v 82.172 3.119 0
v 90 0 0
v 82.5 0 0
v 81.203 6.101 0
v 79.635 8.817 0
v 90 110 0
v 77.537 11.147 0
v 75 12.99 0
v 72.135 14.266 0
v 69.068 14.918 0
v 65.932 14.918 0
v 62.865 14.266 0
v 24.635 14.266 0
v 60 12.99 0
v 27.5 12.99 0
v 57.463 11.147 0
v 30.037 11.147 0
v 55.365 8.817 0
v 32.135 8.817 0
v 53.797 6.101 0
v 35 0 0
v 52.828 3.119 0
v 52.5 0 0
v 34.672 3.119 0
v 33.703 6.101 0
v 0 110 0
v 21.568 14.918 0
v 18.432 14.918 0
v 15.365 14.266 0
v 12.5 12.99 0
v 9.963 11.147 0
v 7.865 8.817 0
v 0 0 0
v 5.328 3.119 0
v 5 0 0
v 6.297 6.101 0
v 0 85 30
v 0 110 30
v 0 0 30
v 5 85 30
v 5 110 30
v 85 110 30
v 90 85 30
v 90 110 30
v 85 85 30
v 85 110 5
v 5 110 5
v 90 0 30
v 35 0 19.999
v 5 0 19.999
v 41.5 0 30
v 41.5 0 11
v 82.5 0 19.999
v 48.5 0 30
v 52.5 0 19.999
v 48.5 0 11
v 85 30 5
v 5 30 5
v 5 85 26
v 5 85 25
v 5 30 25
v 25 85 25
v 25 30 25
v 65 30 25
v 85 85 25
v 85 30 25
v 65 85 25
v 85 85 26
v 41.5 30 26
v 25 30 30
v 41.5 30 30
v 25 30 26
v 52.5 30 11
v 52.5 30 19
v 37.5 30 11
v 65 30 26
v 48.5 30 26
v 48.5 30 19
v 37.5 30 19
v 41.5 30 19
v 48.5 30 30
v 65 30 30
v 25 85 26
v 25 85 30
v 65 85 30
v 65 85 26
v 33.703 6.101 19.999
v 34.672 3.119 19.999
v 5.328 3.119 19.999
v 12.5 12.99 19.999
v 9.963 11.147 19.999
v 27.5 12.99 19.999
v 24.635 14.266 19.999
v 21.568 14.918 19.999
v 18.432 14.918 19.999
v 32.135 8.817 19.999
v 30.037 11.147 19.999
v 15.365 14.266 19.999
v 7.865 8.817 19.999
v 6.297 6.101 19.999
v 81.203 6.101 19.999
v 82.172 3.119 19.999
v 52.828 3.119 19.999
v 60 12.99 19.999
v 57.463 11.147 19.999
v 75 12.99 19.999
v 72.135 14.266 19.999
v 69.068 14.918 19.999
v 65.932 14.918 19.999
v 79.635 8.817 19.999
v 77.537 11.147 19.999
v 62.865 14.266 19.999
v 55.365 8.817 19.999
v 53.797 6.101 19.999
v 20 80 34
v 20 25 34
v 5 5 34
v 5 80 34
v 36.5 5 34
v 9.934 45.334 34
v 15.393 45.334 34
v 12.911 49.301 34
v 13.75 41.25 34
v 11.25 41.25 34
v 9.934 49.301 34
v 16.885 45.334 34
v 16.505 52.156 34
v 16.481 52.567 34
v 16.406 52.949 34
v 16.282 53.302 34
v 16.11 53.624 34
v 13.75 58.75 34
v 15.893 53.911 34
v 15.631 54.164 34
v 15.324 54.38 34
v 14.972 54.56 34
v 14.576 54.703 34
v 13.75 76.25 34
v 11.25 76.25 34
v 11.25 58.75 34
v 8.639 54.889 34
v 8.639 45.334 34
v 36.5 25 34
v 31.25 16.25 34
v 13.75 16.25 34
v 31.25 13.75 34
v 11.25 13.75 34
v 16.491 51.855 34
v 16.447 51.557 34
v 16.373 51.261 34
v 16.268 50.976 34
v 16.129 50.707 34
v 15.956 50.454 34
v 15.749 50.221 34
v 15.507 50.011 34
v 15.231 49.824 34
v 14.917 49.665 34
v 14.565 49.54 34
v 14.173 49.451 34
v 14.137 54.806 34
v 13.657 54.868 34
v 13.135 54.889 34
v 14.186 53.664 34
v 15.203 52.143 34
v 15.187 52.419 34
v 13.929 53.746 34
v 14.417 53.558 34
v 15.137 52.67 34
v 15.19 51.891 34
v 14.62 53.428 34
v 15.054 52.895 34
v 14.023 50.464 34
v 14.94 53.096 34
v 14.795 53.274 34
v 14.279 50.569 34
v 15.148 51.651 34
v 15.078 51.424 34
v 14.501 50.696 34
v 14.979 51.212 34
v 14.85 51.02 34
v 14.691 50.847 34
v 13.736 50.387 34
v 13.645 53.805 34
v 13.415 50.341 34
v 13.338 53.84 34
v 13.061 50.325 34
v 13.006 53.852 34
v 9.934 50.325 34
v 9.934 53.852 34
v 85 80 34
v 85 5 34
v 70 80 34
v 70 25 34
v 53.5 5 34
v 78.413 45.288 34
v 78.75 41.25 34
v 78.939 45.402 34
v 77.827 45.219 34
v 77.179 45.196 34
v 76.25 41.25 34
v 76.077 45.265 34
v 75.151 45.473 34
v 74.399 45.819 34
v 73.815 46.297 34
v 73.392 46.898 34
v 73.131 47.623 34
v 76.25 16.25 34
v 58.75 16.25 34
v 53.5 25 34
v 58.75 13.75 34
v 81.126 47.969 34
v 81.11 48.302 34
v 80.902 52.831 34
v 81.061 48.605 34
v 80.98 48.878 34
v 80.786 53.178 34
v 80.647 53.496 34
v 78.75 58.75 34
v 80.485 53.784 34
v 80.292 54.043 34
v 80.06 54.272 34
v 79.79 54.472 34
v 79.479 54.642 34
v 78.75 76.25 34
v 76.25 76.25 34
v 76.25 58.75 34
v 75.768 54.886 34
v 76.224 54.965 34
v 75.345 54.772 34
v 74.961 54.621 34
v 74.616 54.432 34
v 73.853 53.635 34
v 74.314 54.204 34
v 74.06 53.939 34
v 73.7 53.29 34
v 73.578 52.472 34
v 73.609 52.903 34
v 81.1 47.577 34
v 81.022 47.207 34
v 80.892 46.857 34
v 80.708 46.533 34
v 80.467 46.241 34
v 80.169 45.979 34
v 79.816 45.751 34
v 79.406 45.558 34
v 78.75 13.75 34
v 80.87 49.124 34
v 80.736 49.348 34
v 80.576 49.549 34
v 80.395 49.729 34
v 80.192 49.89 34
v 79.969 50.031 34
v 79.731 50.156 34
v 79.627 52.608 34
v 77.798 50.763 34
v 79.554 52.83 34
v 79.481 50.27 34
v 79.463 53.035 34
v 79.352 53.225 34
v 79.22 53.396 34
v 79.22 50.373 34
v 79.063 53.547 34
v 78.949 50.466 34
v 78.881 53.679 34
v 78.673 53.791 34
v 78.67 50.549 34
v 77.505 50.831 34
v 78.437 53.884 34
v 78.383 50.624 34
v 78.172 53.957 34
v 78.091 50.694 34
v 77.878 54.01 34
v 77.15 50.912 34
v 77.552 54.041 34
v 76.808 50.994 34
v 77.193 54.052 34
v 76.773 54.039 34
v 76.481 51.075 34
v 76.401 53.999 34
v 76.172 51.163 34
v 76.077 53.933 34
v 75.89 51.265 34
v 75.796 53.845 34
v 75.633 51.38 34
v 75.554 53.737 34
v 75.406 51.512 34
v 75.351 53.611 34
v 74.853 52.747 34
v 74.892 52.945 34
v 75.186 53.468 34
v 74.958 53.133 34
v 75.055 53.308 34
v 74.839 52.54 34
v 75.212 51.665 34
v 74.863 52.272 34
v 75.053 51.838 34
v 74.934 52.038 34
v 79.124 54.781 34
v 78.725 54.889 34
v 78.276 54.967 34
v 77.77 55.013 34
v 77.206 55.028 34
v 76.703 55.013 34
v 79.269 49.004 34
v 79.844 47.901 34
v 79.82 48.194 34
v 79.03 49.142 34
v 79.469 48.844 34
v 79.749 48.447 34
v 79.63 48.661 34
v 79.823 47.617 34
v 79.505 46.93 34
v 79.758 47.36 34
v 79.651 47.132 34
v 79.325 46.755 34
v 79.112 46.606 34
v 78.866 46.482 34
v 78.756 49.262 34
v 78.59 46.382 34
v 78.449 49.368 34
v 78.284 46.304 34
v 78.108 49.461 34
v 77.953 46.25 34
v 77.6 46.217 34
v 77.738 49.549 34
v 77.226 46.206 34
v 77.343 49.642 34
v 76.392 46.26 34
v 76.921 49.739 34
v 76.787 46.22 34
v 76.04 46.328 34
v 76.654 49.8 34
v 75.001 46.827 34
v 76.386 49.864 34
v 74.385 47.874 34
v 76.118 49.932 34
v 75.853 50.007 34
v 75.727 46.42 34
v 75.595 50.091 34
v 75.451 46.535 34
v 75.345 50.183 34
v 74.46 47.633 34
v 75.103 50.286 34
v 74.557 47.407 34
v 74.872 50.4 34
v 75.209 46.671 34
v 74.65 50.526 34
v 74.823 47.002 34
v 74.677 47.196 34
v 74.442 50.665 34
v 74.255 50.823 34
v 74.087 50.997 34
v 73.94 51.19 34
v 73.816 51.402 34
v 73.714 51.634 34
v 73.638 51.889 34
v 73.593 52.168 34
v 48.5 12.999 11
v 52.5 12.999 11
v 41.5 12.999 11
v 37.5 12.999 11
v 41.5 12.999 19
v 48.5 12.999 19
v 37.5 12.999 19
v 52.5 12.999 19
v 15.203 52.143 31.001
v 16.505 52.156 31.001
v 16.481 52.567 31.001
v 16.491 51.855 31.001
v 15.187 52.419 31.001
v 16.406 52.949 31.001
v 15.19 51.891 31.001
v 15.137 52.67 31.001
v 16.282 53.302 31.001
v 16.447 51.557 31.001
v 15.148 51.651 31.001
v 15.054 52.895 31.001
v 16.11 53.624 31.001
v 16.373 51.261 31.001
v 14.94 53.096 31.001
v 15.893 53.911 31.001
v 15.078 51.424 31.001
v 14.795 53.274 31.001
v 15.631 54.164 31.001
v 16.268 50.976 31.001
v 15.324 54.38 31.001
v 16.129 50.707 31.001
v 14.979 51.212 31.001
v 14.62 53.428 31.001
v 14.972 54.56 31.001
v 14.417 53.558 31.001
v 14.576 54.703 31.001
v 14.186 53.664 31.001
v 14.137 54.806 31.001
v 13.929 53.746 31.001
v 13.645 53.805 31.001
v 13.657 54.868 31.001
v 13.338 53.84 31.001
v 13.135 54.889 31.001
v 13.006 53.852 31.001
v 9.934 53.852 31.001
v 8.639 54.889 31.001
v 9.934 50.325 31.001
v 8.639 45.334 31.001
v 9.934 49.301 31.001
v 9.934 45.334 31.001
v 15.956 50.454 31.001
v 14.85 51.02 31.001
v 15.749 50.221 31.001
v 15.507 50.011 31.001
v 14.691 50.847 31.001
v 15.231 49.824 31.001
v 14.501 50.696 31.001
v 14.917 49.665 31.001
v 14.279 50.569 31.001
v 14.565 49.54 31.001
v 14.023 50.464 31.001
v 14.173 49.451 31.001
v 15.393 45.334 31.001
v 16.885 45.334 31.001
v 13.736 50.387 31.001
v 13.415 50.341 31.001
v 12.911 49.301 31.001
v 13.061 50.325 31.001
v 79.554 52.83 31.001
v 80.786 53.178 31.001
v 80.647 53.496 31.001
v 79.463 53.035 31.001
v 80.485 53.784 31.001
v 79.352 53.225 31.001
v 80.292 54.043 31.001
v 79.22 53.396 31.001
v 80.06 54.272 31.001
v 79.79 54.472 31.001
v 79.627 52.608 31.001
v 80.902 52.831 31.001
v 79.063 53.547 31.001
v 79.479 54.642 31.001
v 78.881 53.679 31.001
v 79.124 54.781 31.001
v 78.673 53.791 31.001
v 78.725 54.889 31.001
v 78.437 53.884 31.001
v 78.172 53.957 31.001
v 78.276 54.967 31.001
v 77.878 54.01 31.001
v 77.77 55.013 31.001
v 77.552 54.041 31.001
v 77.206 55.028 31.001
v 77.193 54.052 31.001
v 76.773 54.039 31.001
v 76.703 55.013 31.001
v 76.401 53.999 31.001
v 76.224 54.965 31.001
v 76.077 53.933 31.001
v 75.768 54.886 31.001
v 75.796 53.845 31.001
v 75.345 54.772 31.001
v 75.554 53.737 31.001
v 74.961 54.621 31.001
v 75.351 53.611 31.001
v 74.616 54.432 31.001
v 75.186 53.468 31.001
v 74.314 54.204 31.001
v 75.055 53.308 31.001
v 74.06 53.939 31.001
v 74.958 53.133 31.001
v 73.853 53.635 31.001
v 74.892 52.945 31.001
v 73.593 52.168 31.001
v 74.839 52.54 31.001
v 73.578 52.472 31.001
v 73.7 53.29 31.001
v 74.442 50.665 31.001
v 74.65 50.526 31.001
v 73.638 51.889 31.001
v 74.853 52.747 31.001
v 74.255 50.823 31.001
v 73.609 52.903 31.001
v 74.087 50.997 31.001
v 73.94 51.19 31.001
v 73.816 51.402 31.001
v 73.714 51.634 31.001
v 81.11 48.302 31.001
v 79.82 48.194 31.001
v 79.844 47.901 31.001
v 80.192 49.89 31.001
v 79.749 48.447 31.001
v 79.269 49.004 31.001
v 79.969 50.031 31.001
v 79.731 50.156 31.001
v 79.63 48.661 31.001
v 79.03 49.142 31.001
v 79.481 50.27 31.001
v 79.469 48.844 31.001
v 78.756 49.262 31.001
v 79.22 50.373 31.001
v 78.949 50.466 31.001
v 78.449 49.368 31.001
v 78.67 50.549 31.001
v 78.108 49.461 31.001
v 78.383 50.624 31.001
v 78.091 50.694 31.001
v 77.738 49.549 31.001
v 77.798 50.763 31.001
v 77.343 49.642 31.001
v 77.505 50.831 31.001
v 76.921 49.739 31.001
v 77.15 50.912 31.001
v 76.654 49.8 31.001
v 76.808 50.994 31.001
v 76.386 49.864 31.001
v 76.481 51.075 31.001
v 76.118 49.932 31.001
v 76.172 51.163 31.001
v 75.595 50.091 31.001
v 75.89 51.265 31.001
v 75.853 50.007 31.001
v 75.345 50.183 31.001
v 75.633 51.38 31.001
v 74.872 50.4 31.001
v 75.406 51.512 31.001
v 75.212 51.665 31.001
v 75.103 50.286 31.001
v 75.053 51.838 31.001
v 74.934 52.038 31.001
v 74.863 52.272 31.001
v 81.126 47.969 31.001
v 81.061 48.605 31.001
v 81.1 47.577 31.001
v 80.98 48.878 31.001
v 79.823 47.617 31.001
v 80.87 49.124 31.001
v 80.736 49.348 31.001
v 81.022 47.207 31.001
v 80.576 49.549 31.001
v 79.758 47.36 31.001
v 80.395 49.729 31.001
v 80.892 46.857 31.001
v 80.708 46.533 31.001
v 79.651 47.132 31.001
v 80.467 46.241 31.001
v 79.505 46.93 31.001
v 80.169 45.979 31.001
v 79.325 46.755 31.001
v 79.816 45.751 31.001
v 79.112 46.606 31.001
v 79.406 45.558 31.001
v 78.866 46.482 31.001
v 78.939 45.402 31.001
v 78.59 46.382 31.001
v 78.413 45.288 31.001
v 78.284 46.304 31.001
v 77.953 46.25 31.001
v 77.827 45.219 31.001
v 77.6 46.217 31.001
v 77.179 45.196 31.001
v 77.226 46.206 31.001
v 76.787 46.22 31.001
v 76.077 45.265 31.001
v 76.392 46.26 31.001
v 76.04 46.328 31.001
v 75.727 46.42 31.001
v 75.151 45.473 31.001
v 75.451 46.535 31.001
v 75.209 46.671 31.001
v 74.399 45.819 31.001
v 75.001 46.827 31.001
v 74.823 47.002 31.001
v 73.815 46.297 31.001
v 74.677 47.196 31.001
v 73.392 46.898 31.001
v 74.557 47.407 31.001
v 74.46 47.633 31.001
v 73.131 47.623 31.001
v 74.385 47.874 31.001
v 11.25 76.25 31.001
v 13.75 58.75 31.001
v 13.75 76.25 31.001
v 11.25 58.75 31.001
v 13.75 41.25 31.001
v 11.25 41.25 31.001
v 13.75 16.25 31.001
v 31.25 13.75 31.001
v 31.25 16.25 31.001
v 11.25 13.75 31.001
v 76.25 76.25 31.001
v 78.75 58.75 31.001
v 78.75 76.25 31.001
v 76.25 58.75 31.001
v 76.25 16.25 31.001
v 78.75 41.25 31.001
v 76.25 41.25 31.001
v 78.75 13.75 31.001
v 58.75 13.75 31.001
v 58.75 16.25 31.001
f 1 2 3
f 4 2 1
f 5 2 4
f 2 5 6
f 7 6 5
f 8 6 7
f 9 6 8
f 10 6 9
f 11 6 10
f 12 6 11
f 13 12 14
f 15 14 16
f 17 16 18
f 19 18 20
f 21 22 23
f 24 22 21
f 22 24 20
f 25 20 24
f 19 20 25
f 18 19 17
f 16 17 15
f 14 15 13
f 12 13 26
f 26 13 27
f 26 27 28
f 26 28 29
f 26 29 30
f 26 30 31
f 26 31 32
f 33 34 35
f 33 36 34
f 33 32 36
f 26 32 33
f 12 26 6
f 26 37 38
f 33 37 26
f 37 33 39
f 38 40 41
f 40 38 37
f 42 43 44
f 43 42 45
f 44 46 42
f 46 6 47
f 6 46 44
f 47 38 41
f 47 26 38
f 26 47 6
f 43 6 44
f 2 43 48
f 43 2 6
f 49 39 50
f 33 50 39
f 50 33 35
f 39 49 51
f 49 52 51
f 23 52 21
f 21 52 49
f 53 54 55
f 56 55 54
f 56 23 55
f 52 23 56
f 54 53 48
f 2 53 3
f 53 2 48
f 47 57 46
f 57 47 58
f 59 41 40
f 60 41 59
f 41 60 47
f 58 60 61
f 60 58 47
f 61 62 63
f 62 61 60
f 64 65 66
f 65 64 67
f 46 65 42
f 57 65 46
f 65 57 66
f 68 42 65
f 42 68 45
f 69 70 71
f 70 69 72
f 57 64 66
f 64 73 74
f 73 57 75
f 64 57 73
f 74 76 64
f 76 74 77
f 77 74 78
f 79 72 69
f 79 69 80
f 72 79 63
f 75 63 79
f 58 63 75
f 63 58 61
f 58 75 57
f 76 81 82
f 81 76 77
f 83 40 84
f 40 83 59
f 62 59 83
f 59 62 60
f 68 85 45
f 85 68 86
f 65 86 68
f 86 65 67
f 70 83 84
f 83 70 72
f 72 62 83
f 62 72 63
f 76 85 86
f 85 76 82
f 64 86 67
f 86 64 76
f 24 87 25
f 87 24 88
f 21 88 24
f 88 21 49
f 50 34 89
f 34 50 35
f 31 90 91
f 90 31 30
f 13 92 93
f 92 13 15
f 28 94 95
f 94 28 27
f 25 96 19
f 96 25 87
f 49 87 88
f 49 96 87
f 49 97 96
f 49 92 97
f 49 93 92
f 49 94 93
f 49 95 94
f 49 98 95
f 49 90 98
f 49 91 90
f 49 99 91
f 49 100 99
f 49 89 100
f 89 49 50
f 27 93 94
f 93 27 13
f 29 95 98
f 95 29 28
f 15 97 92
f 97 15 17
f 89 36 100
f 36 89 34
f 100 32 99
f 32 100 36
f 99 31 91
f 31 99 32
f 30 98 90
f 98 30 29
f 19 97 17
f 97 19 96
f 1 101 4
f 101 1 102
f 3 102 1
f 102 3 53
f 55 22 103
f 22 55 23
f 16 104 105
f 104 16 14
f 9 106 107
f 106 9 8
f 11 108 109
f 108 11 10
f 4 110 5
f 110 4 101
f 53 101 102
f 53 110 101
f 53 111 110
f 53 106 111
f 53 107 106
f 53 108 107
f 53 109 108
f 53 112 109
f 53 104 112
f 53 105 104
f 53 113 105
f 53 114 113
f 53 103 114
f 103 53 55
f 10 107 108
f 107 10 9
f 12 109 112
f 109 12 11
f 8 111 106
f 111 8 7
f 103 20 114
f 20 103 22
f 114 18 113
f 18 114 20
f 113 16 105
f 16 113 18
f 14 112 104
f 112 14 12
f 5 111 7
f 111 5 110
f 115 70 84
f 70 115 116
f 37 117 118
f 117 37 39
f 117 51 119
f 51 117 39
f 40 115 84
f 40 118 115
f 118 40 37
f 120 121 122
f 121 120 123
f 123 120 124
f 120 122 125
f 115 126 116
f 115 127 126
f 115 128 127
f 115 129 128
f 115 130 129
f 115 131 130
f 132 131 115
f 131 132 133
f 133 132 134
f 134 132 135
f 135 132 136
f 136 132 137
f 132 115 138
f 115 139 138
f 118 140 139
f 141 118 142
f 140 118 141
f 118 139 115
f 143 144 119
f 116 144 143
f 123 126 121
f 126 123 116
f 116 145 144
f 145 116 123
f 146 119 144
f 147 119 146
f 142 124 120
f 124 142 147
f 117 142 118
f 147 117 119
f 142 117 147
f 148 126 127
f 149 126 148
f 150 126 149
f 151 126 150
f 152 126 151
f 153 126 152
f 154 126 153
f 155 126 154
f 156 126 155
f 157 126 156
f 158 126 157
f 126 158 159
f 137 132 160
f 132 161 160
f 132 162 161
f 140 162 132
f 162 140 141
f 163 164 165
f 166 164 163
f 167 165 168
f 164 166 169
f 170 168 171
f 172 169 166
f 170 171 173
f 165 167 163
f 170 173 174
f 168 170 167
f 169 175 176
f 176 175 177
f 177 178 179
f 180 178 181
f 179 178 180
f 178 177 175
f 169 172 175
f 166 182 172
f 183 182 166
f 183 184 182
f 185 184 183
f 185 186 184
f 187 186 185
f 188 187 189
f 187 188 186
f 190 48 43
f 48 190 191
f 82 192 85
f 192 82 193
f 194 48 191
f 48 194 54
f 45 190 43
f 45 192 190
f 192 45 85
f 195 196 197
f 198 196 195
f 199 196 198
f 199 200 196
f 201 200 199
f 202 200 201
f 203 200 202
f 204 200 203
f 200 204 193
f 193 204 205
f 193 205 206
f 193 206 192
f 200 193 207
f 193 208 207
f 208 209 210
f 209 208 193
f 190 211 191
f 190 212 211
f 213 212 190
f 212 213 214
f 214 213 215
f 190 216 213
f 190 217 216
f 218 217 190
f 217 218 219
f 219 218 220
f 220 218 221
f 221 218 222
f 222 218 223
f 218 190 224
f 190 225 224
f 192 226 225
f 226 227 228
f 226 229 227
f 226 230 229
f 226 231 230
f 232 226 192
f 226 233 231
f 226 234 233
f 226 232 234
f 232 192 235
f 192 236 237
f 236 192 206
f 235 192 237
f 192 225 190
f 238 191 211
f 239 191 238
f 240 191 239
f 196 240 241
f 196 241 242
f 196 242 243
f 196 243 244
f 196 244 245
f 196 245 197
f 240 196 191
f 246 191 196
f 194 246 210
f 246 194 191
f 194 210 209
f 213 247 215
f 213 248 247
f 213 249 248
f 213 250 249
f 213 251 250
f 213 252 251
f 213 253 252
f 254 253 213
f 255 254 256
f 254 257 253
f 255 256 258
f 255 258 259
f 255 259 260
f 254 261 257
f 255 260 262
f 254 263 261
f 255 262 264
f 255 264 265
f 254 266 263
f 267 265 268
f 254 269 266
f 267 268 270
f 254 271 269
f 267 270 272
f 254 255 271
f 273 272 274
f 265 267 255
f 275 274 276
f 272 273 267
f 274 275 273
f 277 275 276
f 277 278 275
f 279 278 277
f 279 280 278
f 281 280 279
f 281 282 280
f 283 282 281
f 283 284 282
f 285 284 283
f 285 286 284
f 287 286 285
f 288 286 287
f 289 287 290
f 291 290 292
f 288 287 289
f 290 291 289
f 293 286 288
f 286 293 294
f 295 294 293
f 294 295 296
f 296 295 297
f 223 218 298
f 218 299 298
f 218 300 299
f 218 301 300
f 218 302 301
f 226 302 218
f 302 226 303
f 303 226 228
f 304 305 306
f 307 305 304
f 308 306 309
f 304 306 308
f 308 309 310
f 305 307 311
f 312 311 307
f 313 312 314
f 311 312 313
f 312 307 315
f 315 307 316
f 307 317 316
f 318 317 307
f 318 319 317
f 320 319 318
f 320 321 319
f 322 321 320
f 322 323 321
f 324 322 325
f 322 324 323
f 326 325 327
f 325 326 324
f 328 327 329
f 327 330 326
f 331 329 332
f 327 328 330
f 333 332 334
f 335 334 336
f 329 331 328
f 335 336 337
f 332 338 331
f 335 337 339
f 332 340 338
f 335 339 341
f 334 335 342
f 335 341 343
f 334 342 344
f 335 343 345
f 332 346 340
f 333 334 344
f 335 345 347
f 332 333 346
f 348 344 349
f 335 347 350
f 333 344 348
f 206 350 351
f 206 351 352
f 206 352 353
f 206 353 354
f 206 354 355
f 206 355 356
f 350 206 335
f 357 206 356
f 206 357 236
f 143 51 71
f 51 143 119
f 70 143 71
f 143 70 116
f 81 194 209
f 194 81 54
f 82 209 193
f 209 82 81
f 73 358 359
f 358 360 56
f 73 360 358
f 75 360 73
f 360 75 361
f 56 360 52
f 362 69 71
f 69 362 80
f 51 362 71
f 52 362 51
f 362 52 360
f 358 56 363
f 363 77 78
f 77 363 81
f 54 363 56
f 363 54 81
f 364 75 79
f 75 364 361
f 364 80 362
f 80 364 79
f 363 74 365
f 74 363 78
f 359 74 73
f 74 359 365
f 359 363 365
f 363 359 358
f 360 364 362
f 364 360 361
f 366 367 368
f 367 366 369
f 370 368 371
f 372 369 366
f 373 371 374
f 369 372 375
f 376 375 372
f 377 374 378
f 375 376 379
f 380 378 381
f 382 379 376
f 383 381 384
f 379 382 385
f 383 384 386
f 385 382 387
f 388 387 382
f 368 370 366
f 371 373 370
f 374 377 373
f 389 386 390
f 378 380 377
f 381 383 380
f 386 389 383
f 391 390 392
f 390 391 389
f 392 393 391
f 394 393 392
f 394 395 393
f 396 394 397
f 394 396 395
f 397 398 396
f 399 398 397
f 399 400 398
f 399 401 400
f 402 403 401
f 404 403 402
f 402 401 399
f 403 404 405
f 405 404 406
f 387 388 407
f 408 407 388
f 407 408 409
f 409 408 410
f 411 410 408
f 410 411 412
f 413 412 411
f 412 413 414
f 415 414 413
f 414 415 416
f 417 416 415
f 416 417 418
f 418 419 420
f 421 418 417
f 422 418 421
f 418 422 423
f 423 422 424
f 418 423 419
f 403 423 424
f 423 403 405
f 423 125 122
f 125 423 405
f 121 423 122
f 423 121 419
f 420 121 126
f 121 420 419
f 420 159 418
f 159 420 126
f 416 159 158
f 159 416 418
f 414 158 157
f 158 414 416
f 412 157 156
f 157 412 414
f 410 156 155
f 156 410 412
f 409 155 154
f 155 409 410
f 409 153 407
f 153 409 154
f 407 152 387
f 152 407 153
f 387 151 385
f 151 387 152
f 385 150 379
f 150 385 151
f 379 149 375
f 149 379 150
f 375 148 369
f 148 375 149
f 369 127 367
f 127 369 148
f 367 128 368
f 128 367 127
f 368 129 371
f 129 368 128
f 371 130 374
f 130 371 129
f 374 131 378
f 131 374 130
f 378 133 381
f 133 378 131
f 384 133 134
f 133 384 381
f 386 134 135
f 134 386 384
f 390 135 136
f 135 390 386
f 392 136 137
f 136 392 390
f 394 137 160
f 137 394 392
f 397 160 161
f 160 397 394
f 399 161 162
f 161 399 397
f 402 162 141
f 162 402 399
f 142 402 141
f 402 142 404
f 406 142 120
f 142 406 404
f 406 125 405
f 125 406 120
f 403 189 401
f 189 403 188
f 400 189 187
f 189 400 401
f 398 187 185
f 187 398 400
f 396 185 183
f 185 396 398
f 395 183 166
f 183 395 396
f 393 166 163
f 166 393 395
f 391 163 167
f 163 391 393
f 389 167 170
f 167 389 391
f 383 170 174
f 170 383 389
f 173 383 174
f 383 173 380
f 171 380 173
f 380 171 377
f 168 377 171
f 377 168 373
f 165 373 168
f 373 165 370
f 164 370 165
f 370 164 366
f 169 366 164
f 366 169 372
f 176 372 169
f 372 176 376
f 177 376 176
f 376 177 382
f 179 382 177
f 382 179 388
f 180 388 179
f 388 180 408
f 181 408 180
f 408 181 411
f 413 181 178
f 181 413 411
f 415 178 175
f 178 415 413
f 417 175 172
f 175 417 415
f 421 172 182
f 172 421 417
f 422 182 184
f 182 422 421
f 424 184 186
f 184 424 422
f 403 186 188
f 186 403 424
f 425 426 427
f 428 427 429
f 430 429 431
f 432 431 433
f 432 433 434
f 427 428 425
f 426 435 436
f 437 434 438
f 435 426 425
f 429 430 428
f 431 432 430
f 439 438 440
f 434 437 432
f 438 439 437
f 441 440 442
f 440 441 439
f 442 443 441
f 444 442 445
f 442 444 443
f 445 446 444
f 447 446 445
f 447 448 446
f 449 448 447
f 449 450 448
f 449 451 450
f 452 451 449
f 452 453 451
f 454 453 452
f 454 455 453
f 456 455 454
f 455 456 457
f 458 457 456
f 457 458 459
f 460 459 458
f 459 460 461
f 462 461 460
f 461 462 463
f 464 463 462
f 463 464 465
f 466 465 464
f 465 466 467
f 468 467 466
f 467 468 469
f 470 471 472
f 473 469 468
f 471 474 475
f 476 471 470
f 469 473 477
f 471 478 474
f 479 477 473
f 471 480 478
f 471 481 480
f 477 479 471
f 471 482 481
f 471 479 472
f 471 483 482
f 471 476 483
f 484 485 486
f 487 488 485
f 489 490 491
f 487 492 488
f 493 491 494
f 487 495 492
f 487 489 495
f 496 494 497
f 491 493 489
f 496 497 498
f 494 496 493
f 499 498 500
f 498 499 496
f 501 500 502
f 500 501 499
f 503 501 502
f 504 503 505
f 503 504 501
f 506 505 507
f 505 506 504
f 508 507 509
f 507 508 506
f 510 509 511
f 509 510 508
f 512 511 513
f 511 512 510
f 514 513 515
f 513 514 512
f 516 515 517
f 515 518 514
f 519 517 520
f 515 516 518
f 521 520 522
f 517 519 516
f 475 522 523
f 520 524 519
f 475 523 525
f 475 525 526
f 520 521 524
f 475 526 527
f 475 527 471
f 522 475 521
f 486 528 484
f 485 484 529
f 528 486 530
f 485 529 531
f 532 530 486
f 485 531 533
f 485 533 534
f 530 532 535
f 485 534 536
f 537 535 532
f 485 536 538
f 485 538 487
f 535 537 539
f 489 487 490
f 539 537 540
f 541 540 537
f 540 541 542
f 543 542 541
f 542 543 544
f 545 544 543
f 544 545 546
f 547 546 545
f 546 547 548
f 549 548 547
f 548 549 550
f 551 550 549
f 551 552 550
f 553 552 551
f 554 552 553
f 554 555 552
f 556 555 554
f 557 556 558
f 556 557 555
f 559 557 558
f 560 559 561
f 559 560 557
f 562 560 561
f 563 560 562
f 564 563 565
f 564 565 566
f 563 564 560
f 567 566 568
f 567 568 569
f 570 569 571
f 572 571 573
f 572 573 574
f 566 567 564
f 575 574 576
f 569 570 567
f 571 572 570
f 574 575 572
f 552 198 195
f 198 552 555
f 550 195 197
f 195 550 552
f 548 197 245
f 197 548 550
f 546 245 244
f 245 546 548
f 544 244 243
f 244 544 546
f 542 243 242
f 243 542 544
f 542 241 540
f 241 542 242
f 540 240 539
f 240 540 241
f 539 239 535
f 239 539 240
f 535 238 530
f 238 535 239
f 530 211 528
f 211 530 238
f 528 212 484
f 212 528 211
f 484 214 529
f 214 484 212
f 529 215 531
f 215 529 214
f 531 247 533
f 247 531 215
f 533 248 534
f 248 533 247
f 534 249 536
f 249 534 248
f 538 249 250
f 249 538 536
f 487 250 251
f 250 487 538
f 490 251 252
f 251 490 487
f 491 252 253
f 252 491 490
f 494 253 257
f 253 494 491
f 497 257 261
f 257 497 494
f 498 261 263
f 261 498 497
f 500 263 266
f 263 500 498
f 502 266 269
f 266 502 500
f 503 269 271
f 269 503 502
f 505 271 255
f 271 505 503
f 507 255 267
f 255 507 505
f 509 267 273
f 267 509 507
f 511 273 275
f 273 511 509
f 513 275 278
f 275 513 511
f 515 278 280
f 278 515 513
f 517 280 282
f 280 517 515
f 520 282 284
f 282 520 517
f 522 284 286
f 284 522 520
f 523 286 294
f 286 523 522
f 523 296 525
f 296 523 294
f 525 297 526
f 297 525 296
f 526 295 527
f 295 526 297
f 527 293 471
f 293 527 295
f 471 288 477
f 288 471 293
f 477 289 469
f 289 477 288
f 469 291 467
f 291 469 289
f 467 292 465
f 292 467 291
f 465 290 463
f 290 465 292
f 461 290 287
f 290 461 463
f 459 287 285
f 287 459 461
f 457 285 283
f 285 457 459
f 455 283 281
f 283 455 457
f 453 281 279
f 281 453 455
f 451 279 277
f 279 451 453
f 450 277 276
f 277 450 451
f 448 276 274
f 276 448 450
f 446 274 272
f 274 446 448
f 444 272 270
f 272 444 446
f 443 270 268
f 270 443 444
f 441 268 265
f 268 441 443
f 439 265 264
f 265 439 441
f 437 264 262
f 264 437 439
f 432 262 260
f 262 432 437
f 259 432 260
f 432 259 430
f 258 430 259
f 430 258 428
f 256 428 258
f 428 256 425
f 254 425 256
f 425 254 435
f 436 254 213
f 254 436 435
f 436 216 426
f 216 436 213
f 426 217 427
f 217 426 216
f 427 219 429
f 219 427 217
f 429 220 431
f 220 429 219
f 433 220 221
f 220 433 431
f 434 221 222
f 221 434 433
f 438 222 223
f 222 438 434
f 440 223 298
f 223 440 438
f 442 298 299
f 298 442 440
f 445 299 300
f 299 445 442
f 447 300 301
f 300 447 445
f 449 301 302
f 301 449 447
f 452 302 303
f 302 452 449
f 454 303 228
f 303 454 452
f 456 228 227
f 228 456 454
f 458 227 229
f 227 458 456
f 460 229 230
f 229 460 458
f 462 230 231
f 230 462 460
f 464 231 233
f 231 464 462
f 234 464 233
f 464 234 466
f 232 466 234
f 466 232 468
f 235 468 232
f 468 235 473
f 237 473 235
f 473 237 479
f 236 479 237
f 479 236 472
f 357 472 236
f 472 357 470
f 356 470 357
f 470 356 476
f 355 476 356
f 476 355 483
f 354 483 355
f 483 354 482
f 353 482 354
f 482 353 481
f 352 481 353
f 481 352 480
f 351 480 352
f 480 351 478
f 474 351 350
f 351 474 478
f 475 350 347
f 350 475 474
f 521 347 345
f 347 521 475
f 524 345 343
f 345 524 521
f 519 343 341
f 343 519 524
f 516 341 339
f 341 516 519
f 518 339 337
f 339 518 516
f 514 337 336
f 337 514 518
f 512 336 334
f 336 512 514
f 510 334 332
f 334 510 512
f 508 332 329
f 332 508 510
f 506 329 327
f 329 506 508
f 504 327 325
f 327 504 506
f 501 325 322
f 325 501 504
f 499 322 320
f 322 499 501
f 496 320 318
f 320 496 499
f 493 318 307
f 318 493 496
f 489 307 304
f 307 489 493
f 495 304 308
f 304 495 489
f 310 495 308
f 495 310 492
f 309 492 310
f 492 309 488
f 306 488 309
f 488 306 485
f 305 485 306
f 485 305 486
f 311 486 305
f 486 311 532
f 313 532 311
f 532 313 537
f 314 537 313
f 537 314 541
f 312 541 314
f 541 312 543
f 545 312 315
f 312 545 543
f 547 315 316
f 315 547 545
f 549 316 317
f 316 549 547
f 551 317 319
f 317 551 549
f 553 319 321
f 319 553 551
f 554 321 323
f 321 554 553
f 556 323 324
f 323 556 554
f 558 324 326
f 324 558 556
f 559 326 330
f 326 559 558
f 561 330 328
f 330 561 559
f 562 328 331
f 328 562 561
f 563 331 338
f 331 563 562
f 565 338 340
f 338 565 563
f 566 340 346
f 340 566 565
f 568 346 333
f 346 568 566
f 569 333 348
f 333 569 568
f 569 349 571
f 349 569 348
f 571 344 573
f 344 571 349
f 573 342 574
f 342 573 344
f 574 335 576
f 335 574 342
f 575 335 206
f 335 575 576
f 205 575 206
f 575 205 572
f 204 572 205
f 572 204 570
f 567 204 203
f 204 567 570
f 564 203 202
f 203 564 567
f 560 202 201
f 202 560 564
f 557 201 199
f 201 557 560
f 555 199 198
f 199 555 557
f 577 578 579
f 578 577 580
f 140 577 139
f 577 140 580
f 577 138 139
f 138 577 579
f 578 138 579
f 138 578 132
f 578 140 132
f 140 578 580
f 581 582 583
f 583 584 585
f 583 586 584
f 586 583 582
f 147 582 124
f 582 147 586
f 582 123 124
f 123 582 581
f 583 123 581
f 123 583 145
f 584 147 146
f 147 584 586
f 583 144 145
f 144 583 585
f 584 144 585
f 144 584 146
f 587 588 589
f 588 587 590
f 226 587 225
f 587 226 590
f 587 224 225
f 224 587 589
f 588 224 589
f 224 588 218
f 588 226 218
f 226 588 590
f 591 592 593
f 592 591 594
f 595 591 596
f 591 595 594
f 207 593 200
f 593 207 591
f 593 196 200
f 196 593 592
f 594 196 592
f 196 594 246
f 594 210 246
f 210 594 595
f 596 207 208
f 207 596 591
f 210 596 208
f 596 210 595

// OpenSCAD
// All measurements in mm
width = 80;
height = 100;
thickness = 20;
padding = 5;
front_bevel_thickness = 4;

coord_width = 7;
coord_connector_width = 15;
coord_connector_height = 12;
coord_connector_thickness = 8;

letter_indent_amount = 3/4 * front_bevel_thickness;
left_letter = "R";
right_letter = "S";

module basic_mount_outline () {
    difference() {
        difference() {
            difference() {
                linear_extrude(height=thickness + 2 * padding)
                    square([width + 2 * padding, height + 2 * padding]);


                translate([padding, height/5 + 2 * padding, padding])
                linear_extrude(height=thickness)
                    square([width, height + padding]);
            }

            translate([padding, height * 3/4 + 2 * padding, padding])
            linear_extrude(height=thickness + padding + 0.001)
                square([width, height/4 + 2]);
        }

        translate([padding + width/4, 2 * padding + height/5, padding])
        linear_extrude(height=thickness + padding + 0.001)
            square([width/2, height * 4/5]);
    }
}

module front_bevel (bevel_thickness=1) {
    hull() {
        linear_extrude(height=bevel_thickness)
            square([width * 1/4 - padding, height * 4/5 - padding]);

        translate([-padding, -padding, -bevel_thickness])
        linear_extrude(height=bevel_thickness)
            square([width * 1/4 + padding, height * 4/5 + padding]);
    }
}

module front_bevels (bevel_thickness=1) {
    bottom_half = width/2 - coord_width/2;


    translate([padding, padding, thickness + 2 * padding])
        front_bevel(bevel_thickness);
    translate([width * 3/4 + 2 * padding, padding, thickness + 2 * padding])
        front_bevel(bevel_thickness);

    hull() {
        translate([0, 0, thickness + 2 * padding - bevel_thickness])
            linear_extrude(height=bevel_thickness)
                square([bottom_half + padding, height/5 + 2 * padding]);

        translate([padding, padding, thickness + 2 * padding])
            linear_extrude(height=bevel_thickness)
                square([bottom_half - padding, height/5]);
    }

    hull() {
        translate([width/2 + coord_width/2 + padding, 0, thickness + 2 * padding - bevel_thickness])
            linear_extrude(height=bevel_thickness)
                square([bottom_half + padding, height/5 + 2 * padding]);

        translate([2 * padding + width/2 + coord_width/2, padding, thickness + 2 * padding])
            linear_extrude(height=bevel_thickness)
                square([bottom_half - padding, height/5]);
    }
}

module back_cutaway(offset=0) {
    half_dock = width/2 - coord_connector_width/2 - padding/2;
    translate([offset + half_dock/2 + padding, 0, -0.001])
    linear_extrude(height=thickness)
        circle(d=half_dock);
}

module dock_outer_hull () {
        difference() {
            color("orange")
                basic_mount_outline();
            color("orange")
                back_cutaway();
            color("orange")
                back_cutaway(offset=width/2 + 3/2 * padding);
        }
        color("darkorange")
            front_bevels(front_bevel_thickness);
}

module charging_port () {
    coord_frame_center = padding + thickness/2 -coord_connector_thickness/2;
    translate([width/2 + padding - coord_width/2, -0.001, coord_frame_center])
    linear_extrude(0, 0, thickness + 2 * padding + front_bevel_thickness + 0.001)
        square([coord_width, 1/4 * height + padding + 0.002]);

    translate([width/2 + padding - coord_connector_width/2, 1/4 * height - coord_connector_height - 0.001, coord_frame_center])
    linear_extrude(0, 0, coord_connector_thickness)
        square([coord_connector_width, 1/4 * height + 0.002]);
}

module make_letter(letter) {
    color("red")
        linear_extrude(height=letter_indent_amount)
            text(letter, size = width/4 - 2 * padding, font = "Liberation Sans", valign = "center", $fn = 16);
}

module add_letters() {
    letter_start_height = thickness + 2 * padding + front_bevel_thickness - letter_indent_amount + 0.001;

    translate([3/2 * padding, height/2, letter_start_height])
        make_letter(left_letter);
    translate([5/2 * padding + 3/4 * width, height/2, letter_start_height])
        make_letter(right_letter);
}

module add_line(xOffset=0, yOffset=0, rotation=0, length=height/5) {
    line_start_height = thickness + 2 * padding + front_bevel_thickness - letter_indent_amount + 0.001;
    line_width = padding/2;
    translate([xOffset + width/8 + line_width/2, yOffset + (height/4 - 2 * padding)/2 + padding + line_width/2, line_start_height])
    linear_extrude(height=letter_indent_amount)
        rotate([0, 0, rotation])
        square([line_width, length]);
}

module add_lines () {
    line_width = padding/2;

    top_line_height = height/8 + padding;
    top_line_yOffset = height/2 - padding;

    bottom_line_height = height/4 + line_width;

    add_line(yOffset=top_line_yOffset, length=top_line_height);
    add_line(length=bottom_line_height);
    bottom_line_length = width/4;
    add_line(xOffset = bottom_line_length, rotation=90, length=bottom_line_length);

    right_side_start = width * 7/8 - (width/4 - 2 * padding)/2;

    add_line(xOffset=right_side_start, yOffset=top_line_yOffset, length=top_line_height);
    add_line(xOffset=right_side_start, length=bottom_line_height);
    add_line(xOffset=right_side_start + padding/2, rotation=90, length=bottom_line_length);
}

module dock () {
    difference() {
        difference() {
            dock_outer_hull();
            color("orange")
                charging_port();
//            color("orange")
//                translate([width/2 - coord_width/2, -0.001, thickness + 2 * padding + 0.001])
//                    linear_extrude(height=front_bevel_thickness)
//                        square([2 * padding + coord_width, height]);
        }

        add_letters();

        color("red")
            add_lines();
    }
}

dock();
